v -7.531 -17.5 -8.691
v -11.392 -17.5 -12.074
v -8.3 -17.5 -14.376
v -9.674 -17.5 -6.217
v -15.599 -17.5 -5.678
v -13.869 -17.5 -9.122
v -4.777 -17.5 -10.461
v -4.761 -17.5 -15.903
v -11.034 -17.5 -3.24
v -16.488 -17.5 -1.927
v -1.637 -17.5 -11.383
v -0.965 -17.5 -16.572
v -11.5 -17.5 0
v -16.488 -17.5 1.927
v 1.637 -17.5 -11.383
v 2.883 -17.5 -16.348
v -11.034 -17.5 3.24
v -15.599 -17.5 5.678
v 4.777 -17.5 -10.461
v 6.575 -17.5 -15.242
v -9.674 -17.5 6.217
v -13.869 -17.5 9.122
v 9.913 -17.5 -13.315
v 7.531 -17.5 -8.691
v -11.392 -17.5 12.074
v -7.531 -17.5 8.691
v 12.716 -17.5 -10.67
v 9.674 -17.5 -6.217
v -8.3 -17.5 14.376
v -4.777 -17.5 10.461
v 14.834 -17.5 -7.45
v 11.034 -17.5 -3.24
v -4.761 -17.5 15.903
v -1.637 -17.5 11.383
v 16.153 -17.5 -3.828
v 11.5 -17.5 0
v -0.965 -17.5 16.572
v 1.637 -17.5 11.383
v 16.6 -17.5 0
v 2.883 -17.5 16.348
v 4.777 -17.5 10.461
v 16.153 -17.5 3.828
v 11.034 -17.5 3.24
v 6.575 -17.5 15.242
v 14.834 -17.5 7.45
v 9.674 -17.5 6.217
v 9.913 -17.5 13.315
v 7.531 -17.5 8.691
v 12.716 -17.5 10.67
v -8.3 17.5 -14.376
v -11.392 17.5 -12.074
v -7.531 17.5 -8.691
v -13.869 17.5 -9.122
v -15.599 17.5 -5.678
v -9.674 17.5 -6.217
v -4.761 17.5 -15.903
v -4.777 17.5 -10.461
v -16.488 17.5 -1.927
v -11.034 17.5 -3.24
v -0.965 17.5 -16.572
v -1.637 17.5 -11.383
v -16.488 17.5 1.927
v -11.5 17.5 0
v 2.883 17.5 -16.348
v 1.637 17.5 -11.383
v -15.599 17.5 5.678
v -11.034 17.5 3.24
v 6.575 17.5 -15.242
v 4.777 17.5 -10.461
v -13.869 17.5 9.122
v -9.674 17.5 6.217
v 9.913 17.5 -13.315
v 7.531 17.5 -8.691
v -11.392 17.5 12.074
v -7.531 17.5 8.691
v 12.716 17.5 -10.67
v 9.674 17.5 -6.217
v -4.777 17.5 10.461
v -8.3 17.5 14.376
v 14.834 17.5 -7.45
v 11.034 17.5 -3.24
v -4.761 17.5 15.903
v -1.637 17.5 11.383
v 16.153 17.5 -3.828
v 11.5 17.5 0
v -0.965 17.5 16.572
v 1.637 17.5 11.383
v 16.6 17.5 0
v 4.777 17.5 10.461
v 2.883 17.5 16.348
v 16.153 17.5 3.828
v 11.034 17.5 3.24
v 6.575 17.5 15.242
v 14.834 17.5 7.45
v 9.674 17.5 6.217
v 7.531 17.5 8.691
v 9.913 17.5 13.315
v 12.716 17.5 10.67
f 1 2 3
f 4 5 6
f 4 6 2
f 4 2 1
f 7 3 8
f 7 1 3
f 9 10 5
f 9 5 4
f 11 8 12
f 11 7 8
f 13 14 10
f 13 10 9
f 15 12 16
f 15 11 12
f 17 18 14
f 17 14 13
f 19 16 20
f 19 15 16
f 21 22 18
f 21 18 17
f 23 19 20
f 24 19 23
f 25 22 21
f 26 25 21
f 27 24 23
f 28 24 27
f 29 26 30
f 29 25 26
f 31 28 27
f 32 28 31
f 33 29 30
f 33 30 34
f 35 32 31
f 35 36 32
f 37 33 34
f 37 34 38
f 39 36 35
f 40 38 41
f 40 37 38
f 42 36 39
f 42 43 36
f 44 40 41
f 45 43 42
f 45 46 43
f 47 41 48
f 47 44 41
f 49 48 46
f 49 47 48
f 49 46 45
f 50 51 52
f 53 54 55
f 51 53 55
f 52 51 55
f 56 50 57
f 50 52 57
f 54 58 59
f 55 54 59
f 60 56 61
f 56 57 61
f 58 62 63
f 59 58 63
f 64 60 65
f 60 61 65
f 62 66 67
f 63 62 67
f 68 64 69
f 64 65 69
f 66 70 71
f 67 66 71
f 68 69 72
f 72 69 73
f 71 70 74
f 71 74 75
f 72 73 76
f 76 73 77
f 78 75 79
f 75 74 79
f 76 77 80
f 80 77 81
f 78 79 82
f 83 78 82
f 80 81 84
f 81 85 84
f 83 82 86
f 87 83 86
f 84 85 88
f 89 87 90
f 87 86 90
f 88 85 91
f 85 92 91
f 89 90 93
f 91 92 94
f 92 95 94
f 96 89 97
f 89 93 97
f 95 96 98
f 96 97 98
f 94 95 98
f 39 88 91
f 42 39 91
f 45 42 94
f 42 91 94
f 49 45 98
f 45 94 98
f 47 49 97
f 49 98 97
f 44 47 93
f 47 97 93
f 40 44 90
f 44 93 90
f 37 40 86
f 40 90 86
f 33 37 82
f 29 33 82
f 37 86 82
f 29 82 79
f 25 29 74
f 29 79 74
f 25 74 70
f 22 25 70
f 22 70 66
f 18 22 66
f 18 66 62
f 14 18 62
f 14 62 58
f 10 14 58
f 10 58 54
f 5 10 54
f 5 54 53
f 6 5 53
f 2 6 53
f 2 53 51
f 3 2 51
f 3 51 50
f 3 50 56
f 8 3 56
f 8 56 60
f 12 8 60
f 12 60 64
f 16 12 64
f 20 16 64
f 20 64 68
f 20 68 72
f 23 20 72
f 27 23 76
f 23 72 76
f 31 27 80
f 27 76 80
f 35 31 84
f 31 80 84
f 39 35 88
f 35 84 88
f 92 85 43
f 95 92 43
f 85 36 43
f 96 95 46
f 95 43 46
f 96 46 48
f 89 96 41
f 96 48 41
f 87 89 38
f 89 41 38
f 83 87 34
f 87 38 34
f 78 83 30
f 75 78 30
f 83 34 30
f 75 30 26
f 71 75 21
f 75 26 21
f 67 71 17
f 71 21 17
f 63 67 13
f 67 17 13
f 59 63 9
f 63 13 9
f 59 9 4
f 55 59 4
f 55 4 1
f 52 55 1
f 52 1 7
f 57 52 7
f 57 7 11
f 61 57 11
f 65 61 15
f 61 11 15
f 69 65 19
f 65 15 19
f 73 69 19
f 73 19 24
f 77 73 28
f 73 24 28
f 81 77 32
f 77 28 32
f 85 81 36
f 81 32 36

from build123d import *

# Parameters (mm, degrees)
F0_R          = 25
F0_R_2        = 11.5
F1_DEPTH      = 17.5
F1_DEPTH_BACK = 17.5
F0_R_3        = 5
F2_DEPTH      = 6
F3_DEPTH      = 6
F4_R          = 8.4
F6_DEPTH      = 83.1


with BuildPart() as f1:
    # F0 (on Front) → F1 (new body, two sides)
    with BuildSketch(Plane.XZ) as f1_sk:
        Circle(F0_R)
        Circle(F0_R_2, mode=Mode.SUBTRACT)
    extrude(amount=F1_DEPTH)
    extrude(f1_sk.sketch, amount=-F1_DEPTH_BACK)

    # F0 (on Front) → F2 (join)
    with BuildSketch(Plane.XZ):
        Circle(F0_R_2)
        Circle(F0_R_3, mode=Mode.SUBTRACT)
    extrude(amount=F2_DEPTH)

    # F0 (on Front) → F3 (join)
    with BuildSketch(Plane.XZ):
        Circle(F0_R_2)
        Circle(F0_R_3, mode=Mode.SUBTRACT)
    extrude(amount=-F3_DEPTH)

    # F4
    f4_edges = [f1.edges().sort_by_distance(p)[0] for p in [
        (-25, -17.5, 0),
        (-25, 17.5, 0),
    ]]
    fillet(f4_edges, radius=F4_R)

    # F6 (intersect): a face of the model
    f6_faces = [f1.faces().sort_by_distance(p)[0] for p in [
        (-16.1304810973, 17.5, 0),
    ]]
    extrude(f6_faces, amount=-F6_DEPTH, mode=Mode.INTERSECT)


solid = f1.part
